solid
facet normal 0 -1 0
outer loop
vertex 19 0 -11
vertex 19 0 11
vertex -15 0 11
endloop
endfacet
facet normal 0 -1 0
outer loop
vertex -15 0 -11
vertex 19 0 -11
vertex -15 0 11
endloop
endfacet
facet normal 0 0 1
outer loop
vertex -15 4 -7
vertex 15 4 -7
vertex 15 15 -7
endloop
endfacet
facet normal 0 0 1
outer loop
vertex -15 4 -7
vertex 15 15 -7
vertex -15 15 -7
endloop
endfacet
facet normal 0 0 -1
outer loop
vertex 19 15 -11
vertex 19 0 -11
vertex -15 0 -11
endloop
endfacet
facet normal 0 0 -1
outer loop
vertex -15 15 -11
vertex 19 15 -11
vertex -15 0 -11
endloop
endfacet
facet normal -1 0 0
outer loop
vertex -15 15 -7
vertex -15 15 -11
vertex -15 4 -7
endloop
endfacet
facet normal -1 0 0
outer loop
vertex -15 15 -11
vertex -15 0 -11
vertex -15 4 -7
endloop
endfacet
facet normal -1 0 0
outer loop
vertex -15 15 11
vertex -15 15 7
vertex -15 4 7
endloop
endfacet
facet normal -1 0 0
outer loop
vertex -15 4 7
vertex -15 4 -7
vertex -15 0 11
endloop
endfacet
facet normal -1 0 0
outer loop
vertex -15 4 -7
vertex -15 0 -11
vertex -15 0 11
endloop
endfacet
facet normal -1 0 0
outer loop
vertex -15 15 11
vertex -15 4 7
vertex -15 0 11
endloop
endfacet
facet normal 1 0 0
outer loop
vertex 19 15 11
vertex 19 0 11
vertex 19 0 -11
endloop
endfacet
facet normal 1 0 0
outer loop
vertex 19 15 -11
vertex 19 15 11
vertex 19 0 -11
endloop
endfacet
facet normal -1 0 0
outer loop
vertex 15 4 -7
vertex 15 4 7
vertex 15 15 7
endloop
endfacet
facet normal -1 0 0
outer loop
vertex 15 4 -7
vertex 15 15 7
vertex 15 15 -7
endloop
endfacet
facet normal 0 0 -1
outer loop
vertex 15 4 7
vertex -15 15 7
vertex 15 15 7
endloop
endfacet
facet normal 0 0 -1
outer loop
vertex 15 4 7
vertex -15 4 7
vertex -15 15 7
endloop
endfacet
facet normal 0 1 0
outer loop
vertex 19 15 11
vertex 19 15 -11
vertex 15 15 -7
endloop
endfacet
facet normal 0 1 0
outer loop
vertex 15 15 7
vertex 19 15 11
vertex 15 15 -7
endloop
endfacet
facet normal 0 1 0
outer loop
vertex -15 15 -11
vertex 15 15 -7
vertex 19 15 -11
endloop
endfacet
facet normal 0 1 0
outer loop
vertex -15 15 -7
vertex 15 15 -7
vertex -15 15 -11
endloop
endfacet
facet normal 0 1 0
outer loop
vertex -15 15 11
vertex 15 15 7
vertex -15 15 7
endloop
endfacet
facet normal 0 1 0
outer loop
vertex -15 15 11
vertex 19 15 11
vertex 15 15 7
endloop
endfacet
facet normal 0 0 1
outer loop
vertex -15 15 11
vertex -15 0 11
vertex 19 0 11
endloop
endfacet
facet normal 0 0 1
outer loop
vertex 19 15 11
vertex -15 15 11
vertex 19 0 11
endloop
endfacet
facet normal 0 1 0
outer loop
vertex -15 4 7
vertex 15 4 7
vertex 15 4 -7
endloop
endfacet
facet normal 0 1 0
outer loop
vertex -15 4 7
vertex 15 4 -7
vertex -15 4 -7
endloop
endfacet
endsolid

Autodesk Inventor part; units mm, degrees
ref_plane "YZ Plane" through (0, 0, 0) normal (1, 0, 0) x (0, 1, 0)
ref_plane "XZ Plane" through (0, 0, 0) normal (0, 1, 0) x (-1, 0, 0)
ref_plane "XY Plane" through (0, 0, 0) normal (0, 0, 1) x (1, 0, 0)
sketch "Sketch1" plane through (0, 0, 0) normal (0, 1, 0) x (-1, 0, 0)
  line L0 (-15, 7) -> (-15, -7)
  line L1 (-15, -7) -> (15, -7)
  line L2 (15, -7) -> (15, 7)
  line L3 (15, 7) -> (-15, 7)
  line L4 (-15, 7) -> (15, -7) construction
  line L5 (-15, -7) -> (15, 7) construction
  line L6 (-19, 11) -> (-19, -11)
  line L7 (-19, -11) -> (19, -11)
  line L8 (19, -11) -> (19, 11)
  line L9 (19, 11) -> (-19, 11)
  line L10 (15, 7) -> (15, 11)
  line L11 (15, -7) -> (15, -11)
  point P0 (0, 0)
  dimension "d0" = 14
  dimension "d1" = 30
  dimension "d2" = 4
extrude "Extrusion1" add sketch "Sketch1" along normal blind 15 contours L0 L1 L11 L7 L6 L9 L10 L3
extrude "Extrusion2" add sketch "Sketch1" along normal blind 4 contours L3 L2 L1 L0
properties part number "Solenoid Mount"
